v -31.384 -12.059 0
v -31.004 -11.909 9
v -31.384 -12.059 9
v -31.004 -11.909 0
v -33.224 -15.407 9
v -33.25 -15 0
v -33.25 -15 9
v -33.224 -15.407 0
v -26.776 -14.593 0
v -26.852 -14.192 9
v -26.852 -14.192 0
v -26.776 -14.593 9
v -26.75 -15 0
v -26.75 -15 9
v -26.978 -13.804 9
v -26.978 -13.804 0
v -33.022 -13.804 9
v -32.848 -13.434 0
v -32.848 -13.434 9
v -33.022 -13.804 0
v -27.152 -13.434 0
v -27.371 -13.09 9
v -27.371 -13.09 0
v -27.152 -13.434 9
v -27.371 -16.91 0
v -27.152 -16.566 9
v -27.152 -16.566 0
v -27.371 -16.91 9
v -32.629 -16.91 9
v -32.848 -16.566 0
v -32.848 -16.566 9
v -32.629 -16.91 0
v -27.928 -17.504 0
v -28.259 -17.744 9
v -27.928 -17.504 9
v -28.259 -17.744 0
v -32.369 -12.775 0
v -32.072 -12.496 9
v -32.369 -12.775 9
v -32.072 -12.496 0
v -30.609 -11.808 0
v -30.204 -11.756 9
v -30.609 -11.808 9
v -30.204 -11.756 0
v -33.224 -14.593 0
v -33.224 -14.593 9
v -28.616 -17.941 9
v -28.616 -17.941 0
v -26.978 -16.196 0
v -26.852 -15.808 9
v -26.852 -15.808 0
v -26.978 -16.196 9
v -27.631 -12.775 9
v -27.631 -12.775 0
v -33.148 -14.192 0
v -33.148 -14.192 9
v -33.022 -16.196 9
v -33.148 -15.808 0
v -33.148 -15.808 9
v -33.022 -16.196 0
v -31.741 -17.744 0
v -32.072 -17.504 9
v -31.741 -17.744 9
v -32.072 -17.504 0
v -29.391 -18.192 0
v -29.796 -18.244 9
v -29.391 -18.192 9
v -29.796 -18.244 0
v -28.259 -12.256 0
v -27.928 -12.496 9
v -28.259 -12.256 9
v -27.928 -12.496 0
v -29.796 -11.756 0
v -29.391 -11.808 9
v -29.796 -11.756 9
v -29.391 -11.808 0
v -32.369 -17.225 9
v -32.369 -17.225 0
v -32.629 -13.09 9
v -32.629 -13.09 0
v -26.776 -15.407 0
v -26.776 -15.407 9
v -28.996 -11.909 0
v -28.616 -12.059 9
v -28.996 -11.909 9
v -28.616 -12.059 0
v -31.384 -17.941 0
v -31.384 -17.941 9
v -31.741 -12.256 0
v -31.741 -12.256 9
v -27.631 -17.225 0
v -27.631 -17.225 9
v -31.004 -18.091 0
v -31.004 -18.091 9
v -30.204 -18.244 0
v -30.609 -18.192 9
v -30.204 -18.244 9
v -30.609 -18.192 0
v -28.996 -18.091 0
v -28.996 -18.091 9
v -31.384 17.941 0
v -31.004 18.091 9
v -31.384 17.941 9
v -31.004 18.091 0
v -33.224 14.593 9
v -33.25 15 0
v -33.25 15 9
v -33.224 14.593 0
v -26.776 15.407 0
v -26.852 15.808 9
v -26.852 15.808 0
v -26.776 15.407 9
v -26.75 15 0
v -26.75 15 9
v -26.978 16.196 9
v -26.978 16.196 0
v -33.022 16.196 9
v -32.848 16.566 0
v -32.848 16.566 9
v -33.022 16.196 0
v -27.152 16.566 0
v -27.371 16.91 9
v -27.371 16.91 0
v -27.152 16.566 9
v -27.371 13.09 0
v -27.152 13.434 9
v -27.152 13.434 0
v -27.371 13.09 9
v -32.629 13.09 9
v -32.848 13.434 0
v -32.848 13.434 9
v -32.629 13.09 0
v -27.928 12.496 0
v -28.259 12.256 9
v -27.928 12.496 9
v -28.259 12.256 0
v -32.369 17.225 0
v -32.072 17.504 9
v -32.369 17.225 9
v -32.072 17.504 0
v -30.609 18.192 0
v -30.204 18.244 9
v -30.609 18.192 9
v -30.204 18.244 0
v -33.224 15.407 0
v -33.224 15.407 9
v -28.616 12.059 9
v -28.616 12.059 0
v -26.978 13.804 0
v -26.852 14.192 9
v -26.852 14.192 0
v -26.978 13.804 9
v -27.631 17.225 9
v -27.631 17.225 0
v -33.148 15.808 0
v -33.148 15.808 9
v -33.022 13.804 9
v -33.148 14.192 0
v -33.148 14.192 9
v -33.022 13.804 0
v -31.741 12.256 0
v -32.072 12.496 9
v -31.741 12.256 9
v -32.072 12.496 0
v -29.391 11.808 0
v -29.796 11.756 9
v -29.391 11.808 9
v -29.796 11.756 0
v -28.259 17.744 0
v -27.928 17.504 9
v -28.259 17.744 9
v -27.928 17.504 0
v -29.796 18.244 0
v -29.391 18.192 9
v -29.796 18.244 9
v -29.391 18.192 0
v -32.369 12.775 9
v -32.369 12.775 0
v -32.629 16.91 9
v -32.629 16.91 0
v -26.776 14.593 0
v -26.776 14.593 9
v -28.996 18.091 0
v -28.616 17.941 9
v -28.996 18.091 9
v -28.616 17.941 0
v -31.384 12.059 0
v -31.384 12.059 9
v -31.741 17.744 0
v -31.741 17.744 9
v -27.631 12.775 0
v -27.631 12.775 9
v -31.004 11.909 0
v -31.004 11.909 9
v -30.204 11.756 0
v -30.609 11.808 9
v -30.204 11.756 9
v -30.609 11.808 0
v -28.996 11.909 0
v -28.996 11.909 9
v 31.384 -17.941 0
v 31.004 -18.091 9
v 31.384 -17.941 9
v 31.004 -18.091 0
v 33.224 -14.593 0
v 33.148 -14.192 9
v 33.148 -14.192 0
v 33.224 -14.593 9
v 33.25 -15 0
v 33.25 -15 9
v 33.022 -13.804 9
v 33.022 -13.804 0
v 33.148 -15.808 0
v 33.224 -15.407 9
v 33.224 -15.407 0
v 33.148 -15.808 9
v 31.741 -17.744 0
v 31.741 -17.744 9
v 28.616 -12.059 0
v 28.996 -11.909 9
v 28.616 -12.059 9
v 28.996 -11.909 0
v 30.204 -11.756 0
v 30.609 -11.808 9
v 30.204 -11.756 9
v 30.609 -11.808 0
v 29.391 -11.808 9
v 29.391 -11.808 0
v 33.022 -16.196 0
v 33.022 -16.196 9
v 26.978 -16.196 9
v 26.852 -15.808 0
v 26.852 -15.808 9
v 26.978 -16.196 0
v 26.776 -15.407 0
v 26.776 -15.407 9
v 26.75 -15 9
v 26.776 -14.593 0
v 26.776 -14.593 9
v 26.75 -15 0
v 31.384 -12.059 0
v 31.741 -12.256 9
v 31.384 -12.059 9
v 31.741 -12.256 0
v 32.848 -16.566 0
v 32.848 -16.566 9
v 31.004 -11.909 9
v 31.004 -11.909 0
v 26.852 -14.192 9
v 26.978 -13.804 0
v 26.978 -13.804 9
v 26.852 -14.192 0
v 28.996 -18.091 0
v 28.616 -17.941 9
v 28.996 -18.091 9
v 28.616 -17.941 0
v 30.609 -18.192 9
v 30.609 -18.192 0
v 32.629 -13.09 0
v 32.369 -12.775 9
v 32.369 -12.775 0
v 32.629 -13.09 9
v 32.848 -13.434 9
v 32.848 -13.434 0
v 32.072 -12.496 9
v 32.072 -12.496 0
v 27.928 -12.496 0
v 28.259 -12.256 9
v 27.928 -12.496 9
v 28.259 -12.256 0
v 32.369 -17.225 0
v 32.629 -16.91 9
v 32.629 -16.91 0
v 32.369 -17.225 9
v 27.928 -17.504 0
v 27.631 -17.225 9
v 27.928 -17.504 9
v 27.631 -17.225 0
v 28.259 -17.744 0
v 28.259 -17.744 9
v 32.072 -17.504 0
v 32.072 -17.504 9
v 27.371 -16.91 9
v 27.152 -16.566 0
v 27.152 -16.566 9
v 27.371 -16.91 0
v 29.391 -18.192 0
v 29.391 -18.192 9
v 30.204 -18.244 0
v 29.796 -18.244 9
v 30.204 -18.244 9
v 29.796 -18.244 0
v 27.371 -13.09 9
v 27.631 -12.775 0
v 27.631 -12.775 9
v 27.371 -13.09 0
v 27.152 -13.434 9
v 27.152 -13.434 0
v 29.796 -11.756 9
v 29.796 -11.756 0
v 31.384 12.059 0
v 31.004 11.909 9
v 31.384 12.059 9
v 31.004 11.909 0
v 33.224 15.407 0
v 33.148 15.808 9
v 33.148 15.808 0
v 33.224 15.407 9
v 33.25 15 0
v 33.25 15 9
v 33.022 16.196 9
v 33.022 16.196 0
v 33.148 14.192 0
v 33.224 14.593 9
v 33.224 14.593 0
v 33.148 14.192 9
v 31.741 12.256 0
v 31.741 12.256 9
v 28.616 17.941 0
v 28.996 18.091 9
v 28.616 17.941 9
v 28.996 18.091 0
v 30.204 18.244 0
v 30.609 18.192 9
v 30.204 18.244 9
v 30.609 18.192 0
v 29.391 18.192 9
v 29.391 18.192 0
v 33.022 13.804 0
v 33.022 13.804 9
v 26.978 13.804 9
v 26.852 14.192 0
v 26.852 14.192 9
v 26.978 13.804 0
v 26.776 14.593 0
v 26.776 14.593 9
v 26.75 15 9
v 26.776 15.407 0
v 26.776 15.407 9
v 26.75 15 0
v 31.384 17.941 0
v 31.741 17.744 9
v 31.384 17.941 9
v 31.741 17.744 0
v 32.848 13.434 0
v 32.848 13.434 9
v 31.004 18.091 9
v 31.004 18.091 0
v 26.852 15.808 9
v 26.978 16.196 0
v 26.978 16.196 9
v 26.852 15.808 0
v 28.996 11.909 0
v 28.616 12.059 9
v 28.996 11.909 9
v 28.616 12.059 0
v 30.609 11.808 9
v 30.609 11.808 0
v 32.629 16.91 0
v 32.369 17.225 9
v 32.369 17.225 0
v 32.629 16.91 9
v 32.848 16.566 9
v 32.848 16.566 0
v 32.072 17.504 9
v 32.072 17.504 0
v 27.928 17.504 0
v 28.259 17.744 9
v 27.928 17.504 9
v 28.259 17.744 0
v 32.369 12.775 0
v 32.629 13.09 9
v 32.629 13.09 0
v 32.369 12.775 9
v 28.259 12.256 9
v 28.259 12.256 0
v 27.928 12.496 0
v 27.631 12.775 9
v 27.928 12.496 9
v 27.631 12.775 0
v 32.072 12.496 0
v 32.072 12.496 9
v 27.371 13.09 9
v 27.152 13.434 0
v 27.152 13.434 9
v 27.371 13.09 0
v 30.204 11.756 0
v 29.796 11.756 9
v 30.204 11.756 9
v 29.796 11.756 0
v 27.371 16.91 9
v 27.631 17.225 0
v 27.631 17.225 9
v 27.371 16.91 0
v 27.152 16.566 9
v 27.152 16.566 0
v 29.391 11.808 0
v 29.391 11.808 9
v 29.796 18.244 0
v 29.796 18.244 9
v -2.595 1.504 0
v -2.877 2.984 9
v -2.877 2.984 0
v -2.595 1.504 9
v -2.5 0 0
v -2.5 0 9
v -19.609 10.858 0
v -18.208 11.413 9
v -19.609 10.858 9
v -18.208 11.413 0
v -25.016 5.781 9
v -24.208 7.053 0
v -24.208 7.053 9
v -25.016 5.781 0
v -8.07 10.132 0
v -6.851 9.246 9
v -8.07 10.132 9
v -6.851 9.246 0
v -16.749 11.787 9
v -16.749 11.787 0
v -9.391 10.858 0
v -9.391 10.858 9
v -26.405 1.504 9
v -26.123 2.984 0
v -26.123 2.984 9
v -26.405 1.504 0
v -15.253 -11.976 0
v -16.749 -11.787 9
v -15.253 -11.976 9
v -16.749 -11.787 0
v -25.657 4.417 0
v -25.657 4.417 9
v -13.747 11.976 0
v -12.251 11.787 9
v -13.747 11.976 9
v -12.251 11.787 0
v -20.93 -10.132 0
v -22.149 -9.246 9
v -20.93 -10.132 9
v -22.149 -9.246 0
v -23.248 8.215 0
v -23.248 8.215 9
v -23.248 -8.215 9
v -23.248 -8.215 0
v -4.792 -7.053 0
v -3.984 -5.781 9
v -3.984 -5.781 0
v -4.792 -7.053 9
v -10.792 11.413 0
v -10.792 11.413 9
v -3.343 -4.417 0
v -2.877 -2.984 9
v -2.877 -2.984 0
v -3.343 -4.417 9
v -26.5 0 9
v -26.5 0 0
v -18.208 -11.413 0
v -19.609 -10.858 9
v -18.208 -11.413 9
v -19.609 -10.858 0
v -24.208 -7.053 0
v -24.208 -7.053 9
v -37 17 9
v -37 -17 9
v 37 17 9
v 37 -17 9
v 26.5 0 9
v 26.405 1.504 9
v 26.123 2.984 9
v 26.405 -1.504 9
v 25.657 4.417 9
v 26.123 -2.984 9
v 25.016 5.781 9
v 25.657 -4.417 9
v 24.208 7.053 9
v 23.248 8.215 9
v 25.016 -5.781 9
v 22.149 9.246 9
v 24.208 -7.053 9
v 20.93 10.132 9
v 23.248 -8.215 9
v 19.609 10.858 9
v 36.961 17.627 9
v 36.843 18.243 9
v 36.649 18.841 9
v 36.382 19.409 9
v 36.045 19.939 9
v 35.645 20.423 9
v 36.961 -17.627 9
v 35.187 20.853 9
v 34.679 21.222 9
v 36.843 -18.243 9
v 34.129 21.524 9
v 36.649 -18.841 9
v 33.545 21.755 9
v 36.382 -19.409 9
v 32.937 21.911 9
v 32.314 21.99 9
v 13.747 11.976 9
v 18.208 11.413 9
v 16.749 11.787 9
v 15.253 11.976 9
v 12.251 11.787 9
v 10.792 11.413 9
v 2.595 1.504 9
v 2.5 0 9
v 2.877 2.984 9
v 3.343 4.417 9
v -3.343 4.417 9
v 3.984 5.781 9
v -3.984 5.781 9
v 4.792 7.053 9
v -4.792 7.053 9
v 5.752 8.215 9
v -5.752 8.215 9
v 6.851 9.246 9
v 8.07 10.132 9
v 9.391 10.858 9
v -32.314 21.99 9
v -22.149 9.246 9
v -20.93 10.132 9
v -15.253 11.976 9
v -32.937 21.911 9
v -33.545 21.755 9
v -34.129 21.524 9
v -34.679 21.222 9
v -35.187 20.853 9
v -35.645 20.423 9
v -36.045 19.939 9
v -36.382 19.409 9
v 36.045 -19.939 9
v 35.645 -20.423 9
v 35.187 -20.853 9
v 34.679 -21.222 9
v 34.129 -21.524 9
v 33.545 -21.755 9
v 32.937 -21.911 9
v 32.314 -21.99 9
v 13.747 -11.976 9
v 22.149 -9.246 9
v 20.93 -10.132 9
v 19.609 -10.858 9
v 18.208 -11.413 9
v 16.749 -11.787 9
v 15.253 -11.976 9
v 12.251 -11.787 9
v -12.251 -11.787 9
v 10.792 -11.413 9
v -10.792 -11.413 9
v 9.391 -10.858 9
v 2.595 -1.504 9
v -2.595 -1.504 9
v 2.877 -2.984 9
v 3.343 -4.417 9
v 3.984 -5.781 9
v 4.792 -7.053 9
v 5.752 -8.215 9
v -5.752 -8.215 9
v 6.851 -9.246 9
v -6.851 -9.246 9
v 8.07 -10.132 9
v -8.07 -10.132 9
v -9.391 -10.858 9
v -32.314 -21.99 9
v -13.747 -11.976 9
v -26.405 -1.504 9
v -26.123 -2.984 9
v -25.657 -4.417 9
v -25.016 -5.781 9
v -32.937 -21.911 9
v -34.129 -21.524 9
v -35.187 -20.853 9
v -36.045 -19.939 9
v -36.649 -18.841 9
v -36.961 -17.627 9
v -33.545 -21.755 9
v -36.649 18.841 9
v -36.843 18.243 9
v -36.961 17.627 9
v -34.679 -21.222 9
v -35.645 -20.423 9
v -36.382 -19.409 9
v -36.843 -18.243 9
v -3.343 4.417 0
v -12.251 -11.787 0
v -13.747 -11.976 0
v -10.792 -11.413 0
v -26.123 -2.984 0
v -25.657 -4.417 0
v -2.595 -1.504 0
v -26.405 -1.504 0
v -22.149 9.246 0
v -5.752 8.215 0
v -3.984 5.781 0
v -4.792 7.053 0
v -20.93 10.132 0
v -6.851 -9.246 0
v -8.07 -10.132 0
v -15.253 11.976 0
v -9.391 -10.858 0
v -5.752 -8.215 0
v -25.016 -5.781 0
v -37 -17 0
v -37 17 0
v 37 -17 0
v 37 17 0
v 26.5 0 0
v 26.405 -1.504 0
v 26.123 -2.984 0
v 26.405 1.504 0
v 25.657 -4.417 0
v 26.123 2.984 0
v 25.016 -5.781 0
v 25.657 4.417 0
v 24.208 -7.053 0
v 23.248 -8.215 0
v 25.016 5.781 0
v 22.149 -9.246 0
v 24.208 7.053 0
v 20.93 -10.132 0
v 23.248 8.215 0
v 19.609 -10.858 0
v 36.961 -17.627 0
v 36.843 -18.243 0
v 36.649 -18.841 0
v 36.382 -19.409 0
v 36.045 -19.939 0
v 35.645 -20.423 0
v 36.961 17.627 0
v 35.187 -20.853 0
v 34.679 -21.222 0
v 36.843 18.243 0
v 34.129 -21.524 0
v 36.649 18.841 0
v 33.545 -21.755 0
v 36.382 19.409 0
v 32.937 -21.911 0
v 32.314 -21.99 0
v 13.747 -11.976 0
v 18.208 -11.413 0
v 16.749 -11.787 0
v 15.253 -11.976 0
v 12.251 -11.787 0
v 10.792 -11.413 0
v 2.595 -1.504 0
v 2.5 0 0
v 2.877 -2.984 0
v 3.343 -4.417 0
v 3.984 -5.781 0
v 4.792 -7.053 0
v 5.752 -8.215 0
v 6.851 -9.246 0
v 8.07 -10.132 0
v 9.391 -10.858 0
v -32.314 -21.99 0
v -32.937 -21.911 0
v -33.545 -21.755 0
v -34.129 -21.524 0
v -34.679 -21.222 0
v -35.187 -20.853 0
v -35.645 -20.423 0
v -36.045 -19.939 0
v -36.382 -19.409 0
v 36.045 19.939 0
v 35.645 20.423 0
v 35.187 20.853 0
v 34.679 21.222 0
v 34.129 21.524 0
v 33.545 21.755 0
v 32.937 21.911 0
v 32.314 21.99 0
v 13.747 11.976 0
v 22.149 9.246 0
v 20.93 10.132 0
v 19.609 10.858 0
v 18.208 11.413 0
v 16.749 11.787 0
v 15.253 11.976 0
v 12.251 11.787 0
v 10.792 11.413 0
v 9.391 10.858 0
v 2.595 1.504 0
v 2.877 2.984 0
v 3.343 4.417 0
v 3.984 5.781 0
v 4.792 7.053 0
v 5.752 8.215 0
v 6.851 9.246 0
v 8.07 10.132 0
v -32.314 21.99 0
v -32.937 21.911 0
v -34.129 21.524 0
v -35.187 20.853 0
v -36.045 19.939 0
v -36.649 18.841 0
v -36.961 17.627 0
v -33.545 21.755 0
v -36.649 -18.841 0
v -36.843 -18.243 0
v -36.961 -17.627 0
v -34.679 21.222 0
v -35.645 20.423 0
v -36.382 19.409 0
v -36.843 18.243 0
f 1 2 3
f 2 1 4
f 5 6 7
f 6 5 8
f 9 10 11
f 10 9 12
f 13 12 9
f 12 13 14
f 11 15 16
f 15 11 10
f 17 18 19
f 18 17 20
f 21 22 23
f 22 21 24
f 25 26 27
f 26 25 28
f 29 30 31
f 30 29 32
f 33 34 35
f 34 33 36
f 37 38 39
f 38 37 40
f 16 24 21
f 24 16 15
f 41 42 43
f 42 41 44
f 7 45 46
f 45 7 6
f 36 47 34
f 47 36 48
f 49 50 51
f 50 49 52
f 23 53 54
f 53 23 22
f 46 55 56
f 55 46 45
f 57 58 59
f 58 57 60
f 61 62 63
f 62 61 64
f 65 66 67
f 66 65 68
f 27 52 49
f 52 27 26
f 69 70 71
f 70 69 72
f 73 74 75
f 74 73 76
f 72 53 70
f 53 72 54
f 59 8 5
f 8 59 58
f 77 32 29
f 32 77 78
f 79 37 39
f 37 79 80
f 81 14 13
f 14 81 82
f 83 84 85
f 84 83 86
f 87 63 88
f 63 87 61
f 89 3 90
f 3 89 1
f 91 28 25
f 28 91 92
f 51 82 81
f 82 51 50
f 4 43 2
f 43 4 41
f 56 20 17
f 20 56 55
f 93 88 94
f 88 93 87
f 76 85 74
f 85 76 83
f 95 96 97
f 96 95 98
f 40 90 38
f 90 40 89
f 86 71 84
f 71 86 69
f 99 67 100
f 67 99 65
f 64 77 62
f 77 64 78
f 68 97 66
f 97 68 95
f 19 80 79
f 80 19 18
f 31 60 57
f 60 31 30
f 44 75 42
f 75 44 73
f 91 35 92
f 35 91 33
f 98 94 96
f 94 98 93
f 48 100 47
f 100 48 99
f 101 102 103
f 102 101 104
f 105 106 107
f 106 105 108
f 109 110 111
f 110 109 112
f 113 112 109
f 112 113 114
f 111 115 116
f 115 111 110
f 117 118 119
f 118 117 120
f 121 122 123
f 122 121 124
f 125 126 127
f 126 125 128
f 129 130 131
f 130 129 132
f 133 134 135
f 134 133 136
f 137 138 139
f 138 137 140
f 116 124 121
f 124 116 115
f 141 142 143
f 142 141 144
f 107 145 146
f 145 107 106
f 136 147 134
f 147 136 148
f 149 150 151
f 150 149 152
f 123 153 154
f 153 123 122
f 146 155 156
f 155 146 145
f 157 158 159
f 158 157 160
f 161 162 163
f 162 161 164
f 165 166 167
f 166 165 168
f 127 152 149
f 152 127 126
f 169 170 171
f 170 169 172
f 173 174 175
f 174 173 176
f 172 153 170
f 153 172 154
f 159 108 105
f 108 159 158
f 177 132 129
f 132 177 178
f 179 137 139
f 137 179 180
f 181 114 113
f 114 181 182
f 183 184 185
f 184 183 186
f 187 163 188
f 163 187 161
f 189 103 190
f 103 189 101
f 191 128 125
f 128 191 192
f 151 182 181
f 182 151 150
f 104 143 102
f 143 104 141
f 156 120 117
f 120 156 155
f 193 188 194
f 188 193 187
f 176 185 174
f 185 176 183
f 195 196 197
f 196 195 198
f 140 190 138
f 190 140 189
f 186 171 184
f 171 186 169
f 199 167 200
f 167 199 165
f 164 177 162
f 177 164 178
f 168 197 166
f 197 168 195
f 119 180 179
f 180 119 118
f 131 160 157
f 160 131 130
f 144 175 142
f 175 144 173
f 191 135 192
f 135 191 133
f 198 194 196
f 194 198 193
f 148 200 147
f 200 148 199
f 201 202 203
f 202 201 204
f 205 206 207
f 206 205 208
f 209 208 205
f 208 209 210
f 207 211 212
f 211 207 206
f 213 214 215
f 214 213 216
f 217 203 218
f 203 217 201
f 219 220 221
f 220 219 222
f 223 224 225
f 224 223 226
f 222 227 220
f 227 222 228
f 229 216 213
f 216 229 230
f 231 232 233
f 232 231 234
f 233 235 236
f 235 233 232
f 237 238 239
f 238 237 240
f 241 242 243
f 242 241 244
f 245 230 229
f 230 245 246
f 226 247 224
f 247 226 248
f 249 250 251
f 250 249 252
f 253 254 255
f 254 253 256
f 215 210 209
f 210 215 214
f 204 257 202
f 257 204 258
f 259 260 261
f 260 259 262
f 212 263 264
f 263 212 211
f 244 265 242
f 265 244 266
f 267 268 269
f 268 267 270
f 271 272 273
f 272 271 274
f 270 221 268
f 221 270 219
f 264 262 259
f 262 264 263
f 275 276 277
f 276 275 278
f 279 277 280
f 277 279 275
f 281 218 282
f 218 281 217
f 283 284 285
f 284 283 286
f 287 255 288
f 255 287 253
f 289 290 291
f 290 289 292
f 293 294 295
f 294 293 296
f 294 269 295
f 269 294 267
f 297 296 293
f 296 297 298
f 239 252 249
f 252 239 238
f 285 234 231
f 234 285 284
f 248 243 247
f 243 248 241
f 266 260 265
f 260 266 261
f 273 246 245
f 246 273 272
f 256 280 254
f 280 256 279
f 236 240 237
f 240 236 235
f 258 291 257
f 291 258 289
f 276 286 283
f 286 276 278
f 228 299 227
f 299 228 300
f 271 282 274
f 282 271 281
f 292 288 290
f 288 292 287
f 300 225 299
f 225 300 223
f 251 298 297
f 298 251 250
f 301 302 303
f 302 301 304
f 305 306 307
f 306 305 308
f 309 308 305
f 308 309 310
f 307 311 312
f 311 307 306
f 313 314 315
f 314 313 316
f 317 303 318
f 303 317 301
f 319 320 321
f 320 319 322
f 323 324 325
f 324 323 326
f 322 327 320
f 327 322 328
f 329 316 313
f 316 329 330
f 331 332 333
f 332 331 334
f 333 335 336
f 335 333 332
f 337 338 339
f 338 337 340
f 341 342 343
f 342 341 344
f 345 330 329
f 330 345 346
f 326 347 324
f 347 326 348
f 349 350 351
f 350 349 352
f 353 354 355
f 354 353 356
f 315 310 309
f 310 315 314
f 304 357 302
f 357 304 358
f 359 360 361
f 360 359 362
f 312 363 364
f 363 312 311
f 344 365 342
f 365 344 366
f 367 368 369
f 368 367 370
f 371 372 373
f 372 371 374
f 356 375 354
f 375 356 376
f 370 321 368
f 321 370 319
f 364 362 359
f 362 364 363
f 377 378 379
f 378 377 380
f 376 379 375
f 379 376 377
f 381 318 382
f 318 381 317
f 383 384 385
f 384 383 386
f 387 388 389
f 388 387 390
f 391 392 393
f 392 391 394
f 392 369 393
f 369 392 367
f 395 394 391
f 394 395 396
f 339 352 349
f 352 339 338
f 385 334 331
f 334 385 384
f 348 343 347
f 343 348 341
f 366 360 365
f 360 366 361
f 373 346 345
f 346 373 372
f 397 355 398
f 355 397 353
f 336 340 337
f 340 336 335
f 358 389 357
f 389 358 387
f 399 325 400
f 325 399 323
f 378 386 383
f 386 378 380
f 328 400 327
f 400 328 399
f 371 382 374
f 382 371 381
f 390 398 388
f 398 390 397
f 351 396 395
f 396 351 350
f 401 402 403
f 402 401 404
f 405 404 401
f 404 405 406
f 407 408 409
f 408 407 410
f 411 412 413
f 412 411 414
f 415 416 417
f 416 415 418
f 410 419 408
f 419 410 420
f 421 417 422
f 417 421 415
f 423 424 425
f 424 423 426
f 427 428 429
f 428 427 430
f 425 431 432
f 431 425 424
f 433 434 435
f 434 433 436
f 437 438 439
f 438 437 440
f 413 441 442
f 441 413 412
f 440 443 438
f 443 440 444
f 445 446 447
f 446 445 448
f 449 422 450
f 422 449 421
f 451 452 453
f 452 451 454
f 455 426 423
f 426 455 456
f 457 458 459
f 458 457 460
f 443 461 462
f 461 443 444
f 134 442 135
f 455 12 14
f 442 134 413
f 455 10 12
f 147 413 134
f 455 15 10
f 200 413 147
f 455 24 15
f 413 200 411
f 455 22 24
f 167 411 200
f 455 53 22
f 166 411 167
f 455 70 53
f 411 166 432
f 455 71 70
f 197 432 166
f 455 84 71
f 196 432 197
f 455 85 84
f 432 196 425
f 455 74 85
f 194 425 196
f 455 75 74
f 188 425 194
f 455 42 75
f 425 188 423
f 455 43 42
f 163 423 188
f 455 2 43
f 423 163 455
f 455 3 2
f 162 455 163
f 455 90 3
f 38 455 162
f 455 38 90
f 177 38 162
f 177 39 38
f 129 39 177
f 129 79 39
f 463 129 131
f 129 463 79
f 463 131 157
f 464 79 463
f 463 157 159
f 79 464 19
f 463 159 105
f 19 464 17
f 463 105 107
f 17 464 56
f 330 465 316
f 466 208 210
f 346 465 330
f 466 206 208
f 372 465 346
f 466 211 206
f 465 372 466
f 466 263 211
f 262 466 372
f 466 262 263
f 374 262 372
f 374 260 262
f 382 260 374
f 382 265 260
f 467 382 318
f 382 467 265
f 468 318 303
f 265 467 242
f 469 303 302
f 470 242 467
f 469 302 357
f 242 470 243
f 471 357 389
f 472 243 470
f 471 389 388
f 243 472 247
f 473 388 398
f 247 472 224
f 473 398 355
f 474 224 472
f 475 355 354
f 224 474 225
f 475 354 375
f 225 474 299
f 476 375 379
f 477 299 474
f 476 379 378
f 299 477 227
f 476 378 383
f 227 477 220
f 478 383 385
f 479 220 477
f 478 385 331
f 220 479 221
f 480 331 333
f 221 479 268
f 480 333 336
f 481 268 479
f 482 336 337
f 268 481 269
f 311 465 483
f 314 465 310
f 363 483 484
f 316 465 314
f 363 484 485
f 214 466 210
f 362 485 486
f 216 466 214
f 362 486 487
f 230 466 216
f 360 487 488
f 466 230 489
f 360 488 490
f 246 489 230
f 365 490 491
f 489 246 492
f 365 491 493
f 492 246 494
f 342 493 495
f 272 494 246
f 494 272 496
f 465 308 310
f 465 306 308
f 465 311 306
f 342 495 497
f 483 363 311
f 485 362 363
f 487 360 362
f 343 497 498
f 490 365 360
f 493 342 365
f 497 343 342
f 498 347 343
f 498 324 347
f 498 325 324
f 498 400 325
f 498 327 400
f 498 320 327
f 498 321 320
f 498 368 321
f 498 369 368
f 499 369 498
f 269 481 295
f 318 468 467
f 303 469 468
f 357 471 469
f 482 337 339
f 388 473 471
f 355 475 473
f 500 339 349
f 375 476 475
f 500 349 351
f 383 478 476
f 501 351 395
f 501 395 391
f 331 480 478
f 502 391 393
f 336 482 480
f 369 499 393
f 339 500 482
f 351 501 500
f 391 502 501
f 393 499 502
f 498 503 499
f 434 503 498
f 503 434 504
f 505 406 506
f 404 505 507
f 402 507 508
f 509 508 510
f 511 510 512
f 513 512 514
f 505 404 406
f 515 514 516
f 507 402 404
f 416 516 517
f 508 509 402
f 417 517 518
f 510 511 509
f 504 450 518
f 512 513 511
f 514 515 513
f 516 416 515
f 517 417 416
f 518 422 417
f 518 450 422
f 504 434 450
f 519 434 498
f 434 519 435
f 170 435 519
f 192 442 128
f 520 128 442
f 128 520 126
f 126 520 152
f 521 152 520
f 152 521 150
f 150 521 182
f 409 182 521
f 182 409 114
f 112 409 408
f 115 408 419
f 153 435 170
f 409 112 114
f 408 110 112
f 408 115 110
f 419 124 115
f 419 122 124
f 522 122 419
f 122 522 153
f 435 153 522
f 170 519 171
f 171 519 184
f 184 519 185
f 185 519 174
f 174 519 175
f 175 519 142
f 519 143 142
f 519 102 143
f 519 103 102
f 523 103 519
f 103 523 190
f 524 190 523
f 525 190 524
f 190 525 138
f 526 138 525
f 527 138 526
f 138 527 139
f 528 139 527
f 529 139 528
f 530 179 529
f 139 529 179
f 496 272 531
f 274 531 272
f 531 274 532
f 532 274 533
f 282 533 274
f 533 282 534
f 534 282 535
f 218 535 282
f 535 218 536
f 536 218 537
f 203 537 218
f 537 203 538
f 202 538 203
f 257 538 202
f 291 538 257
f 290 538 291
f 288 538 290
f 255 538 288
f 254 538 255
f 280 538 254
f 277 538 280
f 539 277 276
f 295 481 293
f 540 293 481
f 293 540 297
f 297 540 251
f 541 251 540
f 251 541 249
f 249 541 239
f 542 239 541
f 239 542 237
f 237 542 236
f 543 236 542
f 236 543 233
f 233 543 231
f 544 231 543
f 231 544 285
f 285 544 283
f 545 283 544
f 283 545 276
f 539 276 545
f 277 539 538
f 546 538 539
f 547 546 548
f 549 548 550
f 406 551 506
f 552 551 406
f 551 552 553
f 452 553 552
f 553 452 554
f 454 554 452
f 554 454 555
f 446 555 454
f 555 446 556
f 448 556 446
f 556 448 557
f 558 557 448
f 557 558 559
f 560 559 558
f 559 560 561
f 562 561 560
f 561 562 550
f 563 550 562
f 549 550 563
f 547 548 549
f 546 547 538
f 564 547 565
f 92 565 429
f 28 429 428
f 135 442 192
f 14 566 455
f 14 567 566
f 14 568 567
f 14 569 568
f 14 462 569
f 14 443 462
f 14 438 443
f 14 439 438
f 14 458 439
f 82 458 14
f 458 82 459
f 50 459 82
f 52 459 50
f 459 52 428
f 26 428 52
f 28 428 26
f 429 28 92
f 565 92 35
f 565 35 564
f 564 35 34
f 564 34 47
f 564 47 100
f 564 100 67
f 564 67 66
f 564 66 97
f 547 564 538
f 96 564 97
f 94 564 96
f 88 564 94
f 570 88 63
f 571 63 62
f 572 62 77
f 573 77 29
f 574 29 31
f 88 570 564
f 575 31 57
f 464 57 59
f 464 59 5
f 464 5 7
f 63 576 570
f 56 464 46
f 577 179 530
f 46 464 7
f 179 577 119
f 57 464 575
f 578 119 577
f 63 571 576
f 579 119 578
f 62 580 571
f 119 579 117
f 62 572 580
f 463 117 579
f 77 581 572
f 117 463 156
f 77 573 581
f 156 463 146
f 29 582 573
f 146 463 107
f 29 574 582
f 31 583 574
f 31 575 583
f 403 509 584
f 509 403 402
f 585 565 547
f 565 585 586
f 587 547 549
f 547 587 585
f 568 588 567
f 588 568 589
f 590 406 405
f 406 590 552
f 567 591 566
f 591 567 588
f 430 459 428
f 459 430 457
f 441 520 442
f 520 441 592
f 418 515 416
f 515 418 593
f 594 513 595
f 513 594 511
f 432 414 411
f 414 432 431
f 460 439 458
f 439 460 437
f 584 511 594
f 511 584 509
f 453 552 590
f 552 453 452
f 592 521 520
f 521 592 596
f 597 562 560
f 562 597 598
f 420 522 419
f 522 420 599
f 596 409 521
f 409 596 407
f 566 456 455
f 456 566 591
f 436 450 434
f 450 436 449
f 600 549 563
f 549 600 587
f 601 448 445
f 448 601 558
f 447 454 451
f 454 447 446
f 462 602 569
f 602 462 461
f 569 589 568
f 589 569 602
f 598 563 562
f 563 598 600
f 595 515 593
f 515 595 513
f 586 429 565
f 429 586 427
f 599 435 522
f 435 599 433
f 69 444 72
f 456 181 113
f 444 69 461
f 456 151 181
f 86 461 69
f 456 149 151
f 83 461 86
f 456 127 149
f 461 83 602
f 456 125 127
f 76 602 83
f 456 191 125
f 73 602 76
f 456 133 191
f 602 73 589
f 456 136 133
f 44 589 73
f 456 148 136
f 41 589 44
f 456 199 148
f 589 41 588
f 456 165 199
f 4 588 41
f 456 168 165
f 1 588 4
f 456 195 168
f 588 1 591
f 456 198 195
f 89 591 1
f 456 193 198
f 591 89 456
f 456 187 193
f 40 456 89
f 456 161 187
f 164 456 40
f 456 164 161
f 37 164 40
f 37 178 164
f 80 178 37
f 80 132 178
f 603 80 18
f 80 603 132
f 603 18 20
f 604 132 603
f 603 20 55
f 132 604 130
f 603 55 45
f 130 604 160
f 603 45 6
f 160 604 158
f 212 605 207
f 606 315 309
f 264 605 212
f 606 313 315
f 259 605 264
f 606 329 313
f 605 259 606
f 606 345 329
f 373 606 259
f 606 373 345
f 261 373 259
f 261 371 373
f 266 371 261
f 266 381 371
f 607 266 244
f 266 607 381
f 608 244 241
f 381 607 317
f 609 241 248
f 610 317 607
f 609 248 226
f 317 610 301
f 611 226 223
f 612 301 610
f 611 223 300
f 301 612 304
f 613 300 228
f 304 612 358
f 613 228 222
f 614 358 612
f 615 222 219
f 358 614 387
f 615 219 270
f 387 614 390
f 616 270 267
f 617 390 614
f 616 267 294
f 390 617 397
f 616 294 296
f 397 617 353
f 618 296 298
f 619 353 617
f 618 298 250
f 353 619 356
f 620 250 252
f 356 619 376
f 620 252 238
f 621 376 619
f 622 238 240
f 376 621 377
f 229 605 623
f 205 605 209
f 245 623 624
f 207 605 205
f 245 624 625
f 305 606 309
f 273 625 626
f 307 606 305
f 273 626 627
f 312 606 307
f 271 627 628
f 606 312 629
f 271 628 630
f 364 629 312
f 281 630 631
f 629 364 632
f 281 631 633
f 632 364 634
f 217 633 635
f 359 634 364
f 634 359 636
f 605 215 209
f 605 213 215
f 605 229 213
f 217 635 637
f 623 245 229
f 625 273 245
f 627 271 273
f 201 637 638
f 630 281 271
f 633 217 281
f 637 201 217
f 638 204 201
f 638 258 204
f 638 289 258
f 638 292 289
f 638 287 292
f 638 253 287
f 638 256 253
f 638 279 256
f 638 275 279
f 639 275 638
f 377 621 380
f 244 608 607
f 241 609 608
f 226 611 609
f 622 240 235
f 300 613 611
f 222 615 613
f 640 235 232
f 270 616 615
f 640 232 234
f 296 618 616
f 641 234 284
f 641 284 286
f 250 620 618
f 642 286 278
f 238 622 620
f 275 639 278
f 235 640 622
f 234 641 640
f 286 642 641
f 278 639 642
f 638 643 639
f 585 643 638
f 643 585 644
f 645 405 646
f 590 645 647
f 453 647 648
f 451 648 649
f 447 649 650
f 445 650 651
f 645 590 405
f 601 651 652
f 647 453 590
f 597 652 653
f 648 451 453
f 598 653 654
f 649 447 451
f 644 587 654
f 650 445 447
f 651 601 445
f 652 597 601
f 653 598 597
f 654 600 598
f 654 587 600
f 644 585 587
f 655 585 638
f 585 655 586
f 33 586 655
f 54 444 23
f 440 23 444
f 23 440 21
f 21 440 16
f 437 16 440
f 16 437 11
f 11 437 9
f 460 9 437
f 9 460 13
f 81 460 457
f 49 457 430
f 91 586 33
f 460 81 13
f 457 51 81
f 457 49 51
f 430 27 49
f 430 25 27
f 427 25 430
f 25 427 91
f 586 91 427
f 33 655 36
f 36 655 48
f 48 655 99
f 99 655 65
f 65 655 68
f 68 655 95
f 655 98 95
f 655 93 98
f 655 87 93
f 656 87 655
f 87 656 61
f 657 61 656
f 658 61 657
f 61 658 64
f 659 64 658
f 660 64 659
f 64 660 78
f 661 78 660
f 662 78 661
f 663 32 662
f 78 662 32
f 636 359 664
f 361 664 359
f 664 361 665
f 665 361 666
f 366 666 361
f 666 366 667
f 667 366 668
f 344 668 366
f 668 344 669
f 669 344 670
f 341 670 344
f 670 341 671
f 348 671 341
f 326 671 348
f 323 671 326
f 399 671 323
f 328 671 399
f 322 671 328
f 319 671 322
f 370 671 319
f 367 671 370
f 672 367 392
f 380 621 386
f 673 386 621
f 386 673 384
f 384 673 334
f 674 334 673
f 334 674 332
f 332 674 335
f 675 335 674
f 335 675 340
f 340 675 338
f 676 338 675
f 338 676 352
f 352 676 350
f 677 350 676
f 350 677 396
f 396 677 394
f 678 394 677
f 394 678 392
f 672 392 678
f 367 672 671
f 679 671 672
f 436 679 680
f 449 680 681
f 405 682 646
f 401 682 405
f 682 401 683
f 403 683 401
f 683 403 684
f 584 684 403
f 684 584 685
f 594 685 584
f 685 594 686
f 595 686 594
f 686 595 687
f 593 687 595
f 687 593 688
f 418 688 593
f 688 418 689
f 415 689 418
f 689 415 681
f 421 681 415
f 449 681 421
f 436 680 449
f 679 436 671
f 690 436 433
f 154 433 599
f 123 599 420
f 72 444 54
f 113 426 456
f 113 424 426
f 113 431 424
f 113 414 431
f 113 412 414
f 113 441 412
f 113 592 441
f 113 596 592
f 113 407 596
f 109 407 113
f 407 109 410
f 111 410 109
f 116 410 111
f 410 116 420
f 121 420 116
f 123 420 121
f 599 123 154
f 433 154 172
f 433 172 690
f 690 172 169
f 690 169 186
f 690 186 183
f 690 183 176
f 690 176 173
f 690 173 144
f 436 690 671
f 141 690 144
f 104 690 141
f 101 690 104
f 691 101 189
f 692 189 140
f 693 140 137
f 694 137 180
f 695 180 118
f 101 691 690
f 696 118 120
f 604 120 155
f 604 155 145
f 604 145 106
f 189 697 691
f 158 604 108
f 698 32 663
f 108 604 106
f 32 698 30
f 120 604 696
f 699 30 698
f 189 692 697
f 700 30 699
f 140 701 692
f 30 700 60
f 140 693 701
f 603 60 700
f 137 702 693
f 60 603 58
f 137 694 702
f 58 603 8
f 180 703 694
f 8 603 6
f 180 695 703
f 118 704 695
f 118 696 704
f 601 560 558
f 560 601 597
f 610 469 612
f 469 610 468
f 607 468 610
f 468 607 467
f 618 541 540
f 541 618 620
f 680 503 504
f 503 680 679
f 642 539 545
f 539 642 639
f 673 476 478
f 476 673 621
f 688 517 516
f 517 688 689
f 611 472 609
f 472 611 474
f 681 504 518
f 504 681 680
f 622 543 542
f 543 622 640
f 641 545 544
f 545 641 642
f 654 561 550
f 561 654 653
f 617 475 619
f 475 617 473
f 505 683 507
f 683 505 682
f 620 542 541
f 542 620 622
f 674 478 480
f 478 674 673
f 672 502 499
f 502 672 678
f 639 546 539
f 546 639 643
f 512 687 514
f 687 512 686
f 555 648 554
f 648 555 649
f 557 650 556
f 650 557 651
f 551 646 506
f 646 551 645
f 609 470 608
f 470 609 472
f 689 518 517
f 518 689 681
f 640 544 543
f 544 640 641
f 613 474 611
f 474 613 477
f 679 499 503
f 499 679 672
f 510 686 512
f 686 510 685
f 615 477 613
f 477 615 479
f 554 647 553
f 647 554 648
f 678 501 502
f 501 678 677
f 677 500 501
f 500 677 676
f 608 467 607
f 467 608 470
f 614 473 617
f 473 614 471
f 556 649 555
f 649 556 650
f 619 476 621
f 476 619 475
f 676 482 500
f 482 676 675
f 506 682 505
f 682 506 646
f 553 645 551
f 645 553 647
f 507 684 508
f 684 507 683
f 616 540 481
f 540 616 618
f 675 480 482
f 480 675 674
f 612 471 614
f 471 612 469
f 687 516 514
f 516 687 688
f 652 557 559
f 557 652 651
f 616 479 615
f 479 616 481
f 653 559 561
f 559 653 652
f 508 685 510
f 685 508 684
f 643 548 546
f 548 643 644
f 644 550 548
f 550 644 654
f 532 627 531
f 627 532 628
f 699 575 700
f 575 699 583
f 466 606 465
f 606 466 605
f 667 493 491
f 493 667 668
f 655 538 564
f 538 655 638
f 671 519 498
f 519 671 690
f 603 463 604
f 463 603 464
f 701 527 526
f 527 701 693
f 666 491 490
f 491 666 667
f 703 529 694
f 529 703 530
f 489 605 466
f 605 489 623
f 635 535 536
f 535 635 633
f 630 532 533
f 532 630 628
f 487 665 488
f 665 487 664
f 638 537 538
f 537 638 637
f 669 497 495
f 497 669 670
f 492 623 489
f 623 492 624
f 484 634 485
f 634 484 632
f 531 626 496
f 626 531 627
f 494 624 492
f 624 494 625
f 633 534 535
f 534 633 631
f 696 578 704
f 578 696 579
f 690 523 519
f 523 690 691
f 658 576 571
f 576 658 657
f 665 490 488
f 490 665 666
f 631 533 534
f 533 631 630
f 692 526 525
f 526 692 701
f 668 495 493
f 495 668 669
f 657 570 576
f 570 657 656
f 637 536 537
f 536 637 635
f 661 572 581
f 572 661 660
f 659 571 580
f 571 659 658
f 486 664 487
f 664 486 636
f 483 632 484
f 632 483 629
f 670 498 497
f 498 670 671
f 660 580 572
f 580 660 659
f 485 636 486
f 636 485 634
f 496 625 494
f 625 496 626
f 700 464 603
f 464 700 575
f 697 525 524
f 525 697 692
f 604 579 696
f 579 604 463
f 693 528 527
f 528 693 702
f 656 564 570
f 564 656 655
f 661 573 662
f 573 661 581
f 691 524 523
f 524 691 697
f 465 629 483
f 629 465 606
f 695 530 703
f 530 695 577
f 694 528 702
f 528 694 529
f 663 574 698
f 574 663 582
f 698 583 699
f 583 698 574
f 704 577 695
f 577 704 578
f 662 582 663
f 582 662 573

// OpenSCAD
$fn = 50;


difference() {
	union() {
		hull() {
			translate(v = [-32.0000000000, 17.0000000000, 0]) {
				cylinder(h = 9, r = 5);
			}
			translate(v = [32.0000000000, 17.0000000000, 0]) {
				cylinder(h = 9, r = 5);
			}
			translate(v = [-32.0000000000, -17.0000000000, 0]) {
				cylinder(h = 9, r = 5);
			}
			translate(v = [32.0000000000, -17.0000000000, 0]) {
				cylinder(h = 9, r = 5);
			}
		}
	}
	union() {
		#translate(v = [-30.0000000000, -15.0000000000, -100.0000000000]) {
			cylinder(h = 200, r = 3.2500000000);
		}
		#translate(v = [-30.0000000000, 15.0000000000, -100.0000000000]) {
			cylinder(h = 200, r = 3.2500000000);
		}
		#translate(v = [30.0000000000, -15.0000000000, -100.0000000000]) {
			cylinder(h = 200, r = 3.2500000000);
		}
		#translate(v = [30.0000000000, 15.0000000000, -100.0000000000]) {
			cylinder(h = 200, r = 3.2500000000);
		}
		#translate(v = [-14.5000000000, 0, 0]) {
			cylinder(h = 9, r = 12.0000000000);
		}
		#translate(v = [14.5000000000, 0, 0]) {
			cylinder(h = 9, r = 12.0000000000);
		}
	}
}
